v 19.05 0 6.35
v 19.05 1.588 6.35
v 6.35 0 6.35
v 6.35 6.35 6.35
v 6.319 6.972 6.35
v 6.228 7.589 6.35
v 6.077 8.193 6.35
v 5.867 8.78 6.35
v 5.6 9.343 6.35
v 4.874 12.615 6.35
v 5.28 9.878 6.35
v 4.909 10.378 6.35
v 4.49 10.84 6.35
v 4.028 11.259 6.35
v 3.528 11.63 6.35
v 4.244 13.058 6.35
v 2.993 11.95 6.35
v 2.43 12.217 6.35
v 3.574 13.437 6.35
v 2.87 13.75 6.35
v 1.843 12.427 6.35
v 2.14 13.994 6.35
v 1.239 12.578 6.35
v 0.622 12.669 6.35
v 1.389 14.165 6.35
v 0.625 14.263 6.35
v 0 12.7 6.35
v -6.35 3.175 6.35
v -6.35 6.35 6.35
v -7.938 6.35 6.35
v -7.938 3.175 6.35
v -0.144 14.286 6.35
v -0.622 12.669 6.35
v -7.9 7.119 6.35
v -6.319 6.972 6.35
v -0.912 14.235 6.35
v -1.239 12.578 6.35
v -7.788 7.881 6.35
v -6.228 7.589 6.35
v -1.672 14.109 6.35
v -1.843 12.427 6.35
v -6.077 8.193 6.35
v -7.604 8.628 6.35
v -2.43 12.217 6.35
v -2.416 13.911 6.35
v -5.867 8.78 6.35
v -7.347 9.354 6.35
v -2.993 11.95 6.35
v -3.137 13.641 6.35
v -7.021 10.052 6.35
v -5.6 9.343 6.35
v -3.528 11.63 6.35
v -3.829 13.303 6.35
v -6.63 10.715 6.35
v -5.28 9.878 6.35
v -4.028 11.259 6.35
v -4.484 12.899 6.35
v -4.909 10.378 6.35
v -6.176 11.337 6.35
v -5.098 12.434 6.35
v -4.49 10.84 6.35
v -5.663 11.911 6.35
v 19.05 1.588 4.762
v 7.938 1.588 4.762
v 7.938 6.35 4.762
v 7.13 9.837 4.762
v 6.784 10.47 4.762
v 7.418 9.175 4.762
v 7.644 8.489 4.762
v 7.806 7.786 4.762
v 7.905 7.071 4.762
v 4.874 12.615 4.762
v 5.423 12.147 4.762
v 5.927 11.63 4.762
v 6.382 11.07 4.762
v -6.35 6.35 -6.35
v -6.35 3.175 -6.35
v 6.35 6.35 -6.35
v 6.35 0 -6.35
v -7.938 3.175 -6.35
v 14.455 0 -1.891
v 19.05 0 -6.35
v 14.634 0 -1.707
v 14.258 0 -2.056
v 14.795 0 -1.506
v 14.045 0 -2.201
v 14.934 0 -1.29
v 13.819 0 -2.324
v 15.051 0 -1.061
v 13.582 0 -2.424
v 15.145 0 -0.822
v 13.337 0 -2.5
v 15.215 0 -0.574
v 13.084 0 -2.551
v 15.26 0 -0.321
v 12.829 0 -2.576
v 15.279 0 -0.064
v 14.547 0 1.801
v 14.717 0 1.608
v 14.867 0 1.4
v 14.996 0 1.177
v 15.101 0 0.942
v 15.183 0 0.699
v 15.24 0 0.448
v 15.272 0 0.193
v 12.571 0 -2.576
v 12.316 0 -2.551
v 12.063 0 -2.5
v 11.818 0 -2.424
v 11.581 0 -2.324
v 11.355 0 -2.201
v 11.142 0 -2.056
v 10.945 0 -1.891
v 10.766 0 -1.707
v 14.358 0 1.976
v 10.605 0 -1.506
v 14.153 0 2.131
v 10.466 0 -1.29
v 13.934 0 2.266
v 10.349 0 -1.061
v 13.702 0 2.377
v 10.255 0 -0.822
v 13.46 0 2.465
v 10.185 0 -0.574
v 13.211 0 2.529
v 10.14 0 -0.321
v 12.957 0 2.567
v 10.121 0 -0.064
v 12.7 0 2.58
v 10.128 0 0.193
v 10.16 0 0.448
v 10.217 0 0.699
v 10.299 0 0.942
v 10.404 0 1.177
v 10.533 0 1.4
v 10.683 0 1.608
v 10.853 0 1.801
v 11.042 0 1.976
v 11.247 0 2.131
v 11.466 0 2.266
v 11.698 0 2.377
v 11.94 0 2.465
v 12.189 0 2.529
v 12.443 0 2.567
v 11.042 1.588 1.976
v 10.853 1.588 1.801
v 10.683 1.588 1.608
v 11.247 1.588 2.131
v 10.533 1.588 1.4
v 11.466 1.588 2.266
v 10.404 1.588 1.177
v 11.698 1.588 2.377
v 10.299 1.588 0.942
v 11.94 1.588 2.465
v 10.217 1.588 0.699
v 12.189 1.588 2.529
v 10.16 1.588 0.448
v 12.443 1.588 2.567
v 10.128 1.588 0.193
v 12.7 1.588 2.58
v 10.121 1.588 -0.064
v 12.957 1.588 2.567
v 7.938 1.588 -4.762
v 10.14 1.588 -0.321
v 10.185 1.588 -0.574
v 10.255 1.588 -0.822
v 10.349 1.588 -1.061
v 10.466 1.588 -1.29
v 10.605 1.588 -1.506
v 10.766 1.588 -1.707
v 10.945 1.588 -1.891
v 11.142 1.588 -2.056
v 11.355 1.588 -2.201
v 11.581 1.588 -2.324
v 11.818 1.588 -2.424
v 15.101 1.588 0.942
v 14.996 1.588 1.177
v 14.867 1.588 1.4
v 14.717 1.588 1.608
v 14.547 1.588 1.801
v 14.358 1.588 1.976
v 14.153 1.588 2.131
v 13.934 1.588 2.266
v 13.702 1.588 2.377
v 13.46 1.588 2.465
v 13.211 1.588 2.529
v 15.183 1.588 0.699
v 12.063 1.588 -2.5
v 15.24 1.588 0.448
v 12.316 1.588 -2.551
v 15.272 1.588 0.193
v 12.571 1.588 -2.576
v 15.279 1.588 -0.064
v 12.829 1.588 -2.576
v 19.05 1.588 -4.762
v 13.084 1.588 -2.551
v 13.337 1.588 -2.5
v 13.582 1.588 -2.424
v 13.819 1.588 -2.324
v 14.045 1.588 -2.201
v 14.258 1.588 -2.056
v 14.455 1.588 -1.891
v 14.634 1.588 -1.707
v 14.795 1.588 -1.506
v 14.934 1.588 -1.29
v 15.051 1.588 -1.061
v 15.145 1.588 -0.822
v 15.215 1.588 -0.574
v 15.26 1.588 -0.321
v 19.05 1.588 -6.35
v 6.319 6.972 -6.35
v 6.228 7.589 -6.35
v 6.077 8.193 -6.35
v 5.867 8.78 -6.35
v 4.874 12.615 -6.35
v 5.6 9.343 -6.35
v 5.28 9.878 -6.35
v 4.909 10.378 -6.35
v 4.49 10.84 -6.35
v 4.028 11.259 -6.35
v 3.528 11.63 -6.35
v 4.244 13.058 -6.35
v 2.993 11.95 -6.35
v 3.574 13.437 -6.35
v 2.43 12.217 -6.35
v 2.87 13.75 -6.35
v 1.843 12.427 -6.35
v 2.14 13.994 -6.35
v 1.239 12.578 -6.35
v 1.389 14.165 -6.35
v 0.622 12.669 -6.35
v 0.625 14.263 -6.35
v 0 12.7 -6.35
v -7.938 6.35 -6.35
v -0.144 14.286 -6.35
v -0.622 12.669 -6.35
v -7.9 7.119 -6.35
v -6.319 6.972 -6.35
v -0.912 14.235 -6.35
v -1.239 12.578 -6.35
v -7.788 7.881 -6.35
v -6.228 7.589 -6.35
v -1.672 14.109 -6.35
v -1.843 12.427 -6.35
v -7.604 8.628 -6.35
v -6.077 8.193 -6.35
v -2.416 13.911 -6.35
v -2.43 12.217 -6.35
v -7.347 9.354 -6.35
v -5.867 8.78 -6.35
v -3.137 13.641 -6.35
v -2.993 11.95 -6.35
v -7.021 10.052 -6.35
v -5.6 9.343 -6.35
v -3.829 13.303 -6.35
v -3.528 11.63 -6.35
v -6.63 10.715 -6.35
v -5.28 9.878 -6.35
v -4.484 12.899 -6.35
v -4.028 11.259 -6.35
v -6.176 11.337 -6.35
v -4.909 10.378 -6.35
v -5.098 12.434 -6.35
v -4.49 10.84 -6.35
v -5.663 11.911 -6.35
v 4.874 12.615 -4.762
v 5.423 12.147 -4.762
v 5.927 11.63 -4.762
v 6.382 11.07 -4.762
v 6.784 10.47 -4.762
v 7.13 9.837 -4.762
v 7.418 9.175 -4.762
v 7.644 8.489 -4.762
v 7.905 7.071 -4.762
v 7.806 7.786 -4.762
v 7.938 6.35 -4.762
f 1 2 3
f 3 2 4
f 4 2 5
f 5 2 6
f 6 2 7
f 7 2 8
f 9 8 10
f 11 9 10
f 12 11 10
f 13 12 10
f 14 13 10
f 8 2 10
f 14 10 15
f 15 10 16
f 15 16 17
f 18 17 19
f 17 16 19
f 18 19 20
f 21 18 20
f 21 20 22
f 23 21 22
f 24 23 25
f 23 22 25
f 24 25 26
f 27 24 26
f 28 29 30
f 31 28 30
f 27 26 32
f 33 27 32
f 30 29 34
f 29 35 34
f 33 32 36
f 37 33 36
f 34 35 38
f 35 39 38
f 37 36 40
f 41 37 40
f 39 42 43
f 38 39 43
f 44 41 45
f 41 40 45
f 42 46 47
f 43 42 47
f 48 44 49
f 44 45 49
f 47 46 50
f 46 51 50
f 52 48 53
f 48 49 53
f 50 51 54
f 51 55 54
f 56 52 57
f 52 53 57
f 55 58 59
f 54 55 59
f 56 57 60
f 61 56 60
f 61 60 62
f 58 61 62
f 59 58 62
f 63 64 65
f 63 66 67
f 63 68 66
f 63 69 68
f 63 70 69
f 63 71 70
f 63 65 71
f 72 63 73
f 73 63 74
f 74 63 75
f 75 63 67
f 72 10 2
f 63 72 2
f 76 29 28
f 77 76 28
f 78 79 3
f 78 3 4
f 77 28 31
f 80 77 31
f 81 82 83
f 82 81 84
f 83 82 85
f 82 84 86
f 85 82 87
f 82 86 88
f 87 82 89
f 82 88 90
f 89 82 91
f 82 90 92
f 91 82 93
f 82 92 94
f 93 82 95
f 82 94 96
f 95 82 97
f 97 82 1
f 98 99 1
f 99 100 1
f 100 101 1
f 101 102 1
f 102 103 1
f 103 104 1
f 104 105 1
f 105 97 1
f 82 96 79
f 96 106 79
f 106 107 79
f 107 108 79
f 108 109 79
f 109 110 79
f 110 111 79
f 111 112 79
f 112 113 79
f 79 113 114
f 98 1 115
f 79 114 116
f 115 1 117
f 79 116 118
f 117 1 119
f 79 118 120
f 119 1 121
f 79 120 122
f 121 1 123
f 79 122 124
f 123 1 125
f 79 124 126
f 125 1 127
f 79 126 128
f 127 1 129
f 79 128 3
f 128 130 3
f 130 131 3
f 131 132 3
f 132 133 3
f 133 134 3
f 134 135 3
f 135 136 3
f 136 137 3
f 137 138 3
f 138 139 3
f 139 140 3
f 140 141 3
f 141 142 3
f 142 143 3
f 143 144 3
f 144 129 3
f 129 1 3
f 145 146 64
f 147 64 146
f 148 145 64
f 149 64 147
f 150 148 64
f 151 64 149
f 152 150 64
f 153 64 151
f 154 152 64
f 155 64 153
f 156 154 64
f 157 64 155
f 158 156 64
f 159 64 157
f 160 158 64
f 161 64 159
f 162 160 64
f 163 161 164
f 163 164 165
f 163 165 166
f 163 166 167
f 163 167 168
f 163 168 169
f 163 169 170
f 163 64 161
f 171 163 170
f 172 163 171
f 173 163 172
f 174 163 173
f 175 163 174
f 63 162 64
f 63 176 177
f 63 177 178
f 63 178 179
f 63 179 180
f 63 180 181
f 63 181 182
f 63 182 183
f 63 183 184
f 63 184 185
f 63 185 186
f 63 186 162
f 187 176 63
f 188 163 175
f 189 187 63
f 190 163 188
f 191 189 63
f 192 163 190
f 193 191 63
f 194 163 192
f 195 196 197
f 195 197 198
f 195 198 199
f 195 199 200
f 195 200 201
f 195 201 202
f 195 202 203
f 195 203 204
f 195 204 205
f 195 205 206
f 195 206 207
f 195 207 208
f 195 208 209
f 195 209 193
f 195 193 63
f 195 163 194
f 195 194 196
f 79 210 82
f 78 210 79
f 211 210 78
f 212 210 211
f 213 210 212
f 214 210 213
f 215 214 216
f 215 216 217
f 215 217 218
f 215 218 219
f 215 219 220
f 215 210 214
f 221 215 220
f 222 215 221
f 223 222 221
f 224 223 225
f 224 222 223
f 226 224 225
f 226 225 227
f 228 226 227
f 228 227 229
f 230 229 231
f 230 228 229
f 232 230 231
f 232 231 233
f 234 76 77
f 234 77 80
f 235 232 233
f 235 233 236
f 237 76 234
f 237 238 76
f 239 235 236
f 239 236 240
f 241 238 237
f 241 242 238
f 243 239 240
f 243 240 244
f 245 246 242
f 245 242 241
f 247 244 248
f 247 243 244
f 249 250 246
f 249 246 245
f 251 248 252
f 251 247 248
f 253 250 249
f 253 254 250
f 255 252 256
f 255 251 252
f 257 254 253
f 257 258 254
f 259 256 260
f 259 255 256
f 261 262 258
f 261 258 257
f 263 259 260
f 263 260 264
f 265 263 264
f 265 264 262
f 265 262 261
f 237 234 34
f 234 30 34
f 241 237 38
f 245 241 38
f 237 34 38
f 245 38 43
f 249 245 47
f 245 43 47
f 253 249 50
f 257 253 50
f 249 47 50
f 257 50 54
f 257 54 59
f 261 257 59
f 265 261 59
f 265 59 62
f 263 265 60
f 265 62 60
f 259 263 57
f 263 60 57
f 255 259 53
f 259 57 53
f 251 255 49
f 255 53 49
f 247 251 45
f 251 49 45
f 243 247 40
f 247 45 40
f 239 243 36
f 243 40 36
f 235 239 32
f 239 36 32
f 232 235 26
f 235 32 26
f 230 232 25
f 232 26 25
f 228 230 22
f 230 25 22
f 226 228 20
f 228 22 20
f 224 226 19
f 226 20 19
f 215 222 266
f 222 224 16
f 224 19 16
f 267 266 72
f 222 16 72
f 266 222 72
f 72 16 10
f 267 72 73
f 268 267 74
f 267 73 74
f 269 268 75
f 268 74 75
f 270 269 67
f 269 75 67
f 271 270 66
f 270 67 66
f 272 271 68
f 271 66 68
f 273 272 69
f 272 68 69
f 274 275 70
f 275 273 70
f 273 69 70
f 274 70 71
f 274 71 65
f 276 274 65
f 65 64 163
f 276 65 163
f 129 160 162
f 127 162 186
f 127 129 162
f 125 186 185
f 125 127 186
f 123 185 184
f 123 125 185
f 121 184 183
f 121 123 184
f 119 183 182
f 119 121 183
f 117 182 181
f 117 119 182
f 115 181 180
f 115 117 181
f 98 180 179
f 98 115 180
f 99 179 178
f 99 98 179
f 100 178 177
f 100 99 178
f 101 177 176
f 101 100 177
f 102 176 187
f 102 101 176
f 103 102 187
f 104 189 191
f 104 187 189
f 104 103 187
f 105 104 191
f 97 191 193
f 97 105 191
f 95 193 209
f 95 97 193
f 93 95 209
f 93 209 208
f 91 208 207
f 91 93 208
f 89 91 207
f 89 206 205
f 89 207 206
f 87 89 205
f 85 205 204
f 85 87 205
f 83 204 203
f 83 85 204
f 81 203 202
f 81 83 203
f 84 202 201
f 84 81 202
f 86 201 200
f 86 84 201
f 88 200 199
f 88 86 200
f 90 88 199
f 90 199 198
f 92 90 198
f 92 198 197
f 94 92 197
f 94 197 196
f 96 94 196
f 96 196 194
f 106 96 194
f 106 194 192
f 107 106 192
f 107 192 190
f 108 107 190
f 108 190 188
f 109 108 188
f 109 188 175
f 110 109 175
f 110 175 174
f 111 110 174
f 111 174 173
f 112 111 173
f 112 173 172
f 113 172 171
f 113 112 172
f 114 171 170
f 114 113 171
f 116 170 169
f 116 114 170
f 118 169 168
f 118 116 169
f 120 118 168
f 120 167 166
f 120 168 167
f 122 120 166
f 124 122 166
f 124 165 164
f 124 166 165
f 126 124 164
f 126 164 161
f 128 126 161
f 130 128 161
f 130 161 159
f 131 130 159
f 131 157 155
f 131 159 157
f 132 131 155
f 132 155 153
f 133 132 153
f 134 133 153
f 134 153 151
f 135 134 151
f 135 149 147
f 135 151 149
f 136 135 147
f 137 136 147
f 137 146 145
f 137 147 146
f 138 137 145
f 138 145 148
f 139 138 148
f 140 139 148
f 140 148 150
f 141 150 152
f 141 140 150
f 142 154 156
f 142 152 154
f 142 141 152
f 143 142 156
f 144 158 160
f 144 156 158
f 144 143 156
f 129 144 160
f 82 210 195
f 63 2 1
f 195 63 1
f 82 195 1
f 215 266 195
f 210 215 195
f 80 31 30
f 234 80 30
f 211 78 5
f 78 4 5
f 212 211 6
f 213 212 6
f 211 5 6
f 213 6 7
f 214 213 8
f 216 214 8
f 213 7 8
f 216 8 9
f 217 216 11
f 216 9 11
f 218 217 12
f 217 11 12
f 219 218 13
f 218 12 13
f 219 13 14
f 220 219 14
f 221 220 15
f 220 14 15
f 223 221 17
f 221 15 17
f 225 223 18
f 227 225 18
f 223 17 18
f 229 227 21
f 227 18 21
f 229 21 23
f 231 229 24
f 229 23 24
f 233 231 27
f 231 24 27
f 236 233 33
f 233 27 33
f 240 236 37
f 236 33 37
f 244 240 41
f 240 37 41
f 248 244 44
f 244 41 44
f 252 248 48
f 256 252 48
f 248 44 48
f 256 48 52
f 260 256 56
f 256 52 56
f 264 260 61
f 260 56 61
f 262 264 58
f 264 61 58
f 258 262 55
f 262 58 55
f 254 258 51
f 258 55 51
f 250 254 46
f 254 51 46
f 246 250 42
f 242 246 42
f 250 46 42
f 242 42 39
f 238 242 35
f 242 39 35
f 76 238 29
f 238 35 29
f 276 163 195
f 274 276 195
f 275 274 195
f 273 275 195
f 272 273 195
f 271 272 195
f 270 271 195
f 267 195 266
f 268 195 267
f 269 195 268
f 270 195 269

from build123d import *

# Parameters (mm, degrees)
BOSS_EXTRUDE1_DEPTH            = 6.35
CUT_EXTRUDE3_START             = 1.5875
SKETCH4_W                      = 11.112499999999997
SKETCH4_H                      = 9.524999999999999
CUT_EXTRUDE3_DEPTH             = 24.057127330312788
CUT_EXTRUDE4_REACH             = 26.645
CUT_EXTRUDE4_DIRECTION_2_REACH = 26.645
SKETCH3_R                      = 2.5796875
CUT_EXTRUDE2_DEPTH             = 2.54


with BuildPart() as part:
    # Sketch1 → Boss-Extrude1 (new, symmetric)
    with BuildSketch(Plane.XY):
        with BuildLine():
            Line((-7.9375, 3.174999999999999), (-7.9375, 6.35))
            ThreePointArc((-7.9375, 6.35), (-3.487109685994719, 13.480495935616386), (4.873579631582188, 12.615151859662083))
            Line((4.873579631582188, 12.615151859662083), (19.049999999999997, 1.5875000000000004))
            Line((19.049999999999997, 1.5875000000000004), (19.049999999999997, 0))
            Line((19.049999999999997, 0), (6.350000000000001, -1.56e-15))
            Line((6.350000000000001, -1.56e-15), (6.35, 6.3500000000000005))
            ThreePointArc((6.35, 6.3500000000000005), (-1.02e-15, 12.7), (-6.35, 6.349999999999999))
            Line((-6.35, 6.349999999999999), (-6.35, 3.175))
            Line((-6.35, 3.175), (-7.9375, 3.174999999999999))
        make_face()
    extrude(amount=BOSS_EXTRUDE1_DEPTH, both=True)

    # Sketch4 → Cut-Extrude3 (cut, through all)
    with BuildSketch(Plane(origin=(0, 0, 0), x_dir=(1, 0, 0), z_dir=(0, 1, 0)).offset(CUT_EXTRUDE3_START)):
        with Locations((13.493749999999999, 0)):
            Rectangle(SKETCH4_W, SKETCH4_H)
    extrude(amount=CUT_EXTRUDE3_DEPTH, mode=Mode.SUBTRACT)

    # Cut-Extrude4: up to this face of the body (flat: up to its plane)
    cut_extrude4_end = Plane(part.part.faces().sort_by_distance((11.641666667, 4.468922769, 4.7625))[0])
    # Sketch5 → Cut-Extrude4 (cut, up to the picked face)
    with BuildSketch(Plane.XY, mode=Mode.PRIVATE) as cut_extrude4_sk1:
        with BuildLine():
            Line((7.9375, 6.35), (7.9375, 10.231768306511267))
            Line((7.9375, 10.231768306511267), (4.873579631582187, 12.615151859662081))
            ThreePointArc((4.873579631582187, 12.615151859662081), (7.130495935616386, 9.83710968599472), (7.9375, 6.35))
        make_face()
    cut_extrude4_tool1 = split(extrude(cut_extrude4_sk1.sketch, amount=CUT_EXTRUDE4_REACH, mode=Mode.PRIVATE), bisect_by=cut_extrude4_end, keep=Keep.BOTH, mode=Mode.PRIVATE)
    add(cut_extrude4_tool1.solids().sort_by(Axis((7.302263, 9.921111, 0), (0, 0, 1)))[0], mode=Mode.SUBTRACT)

    # Cut-Extrude4 direction 2: up to this face of the body (flat: up to its plane)
    cut_extrude4_direction_2_end = Plane(part.part.faces().sort_by_distance((11.641666667, 4.468922769, -4.7625))[0])
    # Sketch5 → Cut-Extrude4 direction 2 (cut, up to the picked face)
    with BuildSketch(Plane.XY, mode=Mode.PRIVATE) as cut_extrude4_direction_2_sk1:
        with BuildLine():
            Line((7.9375, 6.35), (7.9375, 10.231768306511267))
            Line((7.9375, 10.231768306511267), (4.873579631582187, 12.615151859662081))
            ThreePointArc((4.873579631582187, 12.615151859662081), (7.130495935616386, 9.83710968599472), (7.9375, 6.35))
        make_face()
    cut_extrude4_direction_2_tool1 = split(extrude(cut_extrude4_direction_2_sk1.sketch, amount=-CUT_EXTRUDE4_DIRECTION_2_REACH, mode=Mode.PRIVATE), bisect_by=cut_extrude4_direction_2_end, keep=Keep.BOTH, mode=Mode.PRIVATE)
    add(cut_extrude4_direction_2_tool1.solids().sort_by(Axis((7.302263, 9.921111, 0), (0, 0, -1)))[0], mode=Mode.SUBTRACT)

    # Sketch3 → Cut-Extrude2 (cut)
    with BuildSketch(Plane(origin=(0, 0, 0), x_dir=(1, 0, 0), z_dir=(0, 1, 0))):
        with Locations(Location((12.7, 0, 0), (0, 0, 270))):
            Circle(SKETCH3_R)
    extrude(amount=CUT_EXTRUDE2_DEPTH, mode=Mode.SUBTRACT)


solid = part.part
